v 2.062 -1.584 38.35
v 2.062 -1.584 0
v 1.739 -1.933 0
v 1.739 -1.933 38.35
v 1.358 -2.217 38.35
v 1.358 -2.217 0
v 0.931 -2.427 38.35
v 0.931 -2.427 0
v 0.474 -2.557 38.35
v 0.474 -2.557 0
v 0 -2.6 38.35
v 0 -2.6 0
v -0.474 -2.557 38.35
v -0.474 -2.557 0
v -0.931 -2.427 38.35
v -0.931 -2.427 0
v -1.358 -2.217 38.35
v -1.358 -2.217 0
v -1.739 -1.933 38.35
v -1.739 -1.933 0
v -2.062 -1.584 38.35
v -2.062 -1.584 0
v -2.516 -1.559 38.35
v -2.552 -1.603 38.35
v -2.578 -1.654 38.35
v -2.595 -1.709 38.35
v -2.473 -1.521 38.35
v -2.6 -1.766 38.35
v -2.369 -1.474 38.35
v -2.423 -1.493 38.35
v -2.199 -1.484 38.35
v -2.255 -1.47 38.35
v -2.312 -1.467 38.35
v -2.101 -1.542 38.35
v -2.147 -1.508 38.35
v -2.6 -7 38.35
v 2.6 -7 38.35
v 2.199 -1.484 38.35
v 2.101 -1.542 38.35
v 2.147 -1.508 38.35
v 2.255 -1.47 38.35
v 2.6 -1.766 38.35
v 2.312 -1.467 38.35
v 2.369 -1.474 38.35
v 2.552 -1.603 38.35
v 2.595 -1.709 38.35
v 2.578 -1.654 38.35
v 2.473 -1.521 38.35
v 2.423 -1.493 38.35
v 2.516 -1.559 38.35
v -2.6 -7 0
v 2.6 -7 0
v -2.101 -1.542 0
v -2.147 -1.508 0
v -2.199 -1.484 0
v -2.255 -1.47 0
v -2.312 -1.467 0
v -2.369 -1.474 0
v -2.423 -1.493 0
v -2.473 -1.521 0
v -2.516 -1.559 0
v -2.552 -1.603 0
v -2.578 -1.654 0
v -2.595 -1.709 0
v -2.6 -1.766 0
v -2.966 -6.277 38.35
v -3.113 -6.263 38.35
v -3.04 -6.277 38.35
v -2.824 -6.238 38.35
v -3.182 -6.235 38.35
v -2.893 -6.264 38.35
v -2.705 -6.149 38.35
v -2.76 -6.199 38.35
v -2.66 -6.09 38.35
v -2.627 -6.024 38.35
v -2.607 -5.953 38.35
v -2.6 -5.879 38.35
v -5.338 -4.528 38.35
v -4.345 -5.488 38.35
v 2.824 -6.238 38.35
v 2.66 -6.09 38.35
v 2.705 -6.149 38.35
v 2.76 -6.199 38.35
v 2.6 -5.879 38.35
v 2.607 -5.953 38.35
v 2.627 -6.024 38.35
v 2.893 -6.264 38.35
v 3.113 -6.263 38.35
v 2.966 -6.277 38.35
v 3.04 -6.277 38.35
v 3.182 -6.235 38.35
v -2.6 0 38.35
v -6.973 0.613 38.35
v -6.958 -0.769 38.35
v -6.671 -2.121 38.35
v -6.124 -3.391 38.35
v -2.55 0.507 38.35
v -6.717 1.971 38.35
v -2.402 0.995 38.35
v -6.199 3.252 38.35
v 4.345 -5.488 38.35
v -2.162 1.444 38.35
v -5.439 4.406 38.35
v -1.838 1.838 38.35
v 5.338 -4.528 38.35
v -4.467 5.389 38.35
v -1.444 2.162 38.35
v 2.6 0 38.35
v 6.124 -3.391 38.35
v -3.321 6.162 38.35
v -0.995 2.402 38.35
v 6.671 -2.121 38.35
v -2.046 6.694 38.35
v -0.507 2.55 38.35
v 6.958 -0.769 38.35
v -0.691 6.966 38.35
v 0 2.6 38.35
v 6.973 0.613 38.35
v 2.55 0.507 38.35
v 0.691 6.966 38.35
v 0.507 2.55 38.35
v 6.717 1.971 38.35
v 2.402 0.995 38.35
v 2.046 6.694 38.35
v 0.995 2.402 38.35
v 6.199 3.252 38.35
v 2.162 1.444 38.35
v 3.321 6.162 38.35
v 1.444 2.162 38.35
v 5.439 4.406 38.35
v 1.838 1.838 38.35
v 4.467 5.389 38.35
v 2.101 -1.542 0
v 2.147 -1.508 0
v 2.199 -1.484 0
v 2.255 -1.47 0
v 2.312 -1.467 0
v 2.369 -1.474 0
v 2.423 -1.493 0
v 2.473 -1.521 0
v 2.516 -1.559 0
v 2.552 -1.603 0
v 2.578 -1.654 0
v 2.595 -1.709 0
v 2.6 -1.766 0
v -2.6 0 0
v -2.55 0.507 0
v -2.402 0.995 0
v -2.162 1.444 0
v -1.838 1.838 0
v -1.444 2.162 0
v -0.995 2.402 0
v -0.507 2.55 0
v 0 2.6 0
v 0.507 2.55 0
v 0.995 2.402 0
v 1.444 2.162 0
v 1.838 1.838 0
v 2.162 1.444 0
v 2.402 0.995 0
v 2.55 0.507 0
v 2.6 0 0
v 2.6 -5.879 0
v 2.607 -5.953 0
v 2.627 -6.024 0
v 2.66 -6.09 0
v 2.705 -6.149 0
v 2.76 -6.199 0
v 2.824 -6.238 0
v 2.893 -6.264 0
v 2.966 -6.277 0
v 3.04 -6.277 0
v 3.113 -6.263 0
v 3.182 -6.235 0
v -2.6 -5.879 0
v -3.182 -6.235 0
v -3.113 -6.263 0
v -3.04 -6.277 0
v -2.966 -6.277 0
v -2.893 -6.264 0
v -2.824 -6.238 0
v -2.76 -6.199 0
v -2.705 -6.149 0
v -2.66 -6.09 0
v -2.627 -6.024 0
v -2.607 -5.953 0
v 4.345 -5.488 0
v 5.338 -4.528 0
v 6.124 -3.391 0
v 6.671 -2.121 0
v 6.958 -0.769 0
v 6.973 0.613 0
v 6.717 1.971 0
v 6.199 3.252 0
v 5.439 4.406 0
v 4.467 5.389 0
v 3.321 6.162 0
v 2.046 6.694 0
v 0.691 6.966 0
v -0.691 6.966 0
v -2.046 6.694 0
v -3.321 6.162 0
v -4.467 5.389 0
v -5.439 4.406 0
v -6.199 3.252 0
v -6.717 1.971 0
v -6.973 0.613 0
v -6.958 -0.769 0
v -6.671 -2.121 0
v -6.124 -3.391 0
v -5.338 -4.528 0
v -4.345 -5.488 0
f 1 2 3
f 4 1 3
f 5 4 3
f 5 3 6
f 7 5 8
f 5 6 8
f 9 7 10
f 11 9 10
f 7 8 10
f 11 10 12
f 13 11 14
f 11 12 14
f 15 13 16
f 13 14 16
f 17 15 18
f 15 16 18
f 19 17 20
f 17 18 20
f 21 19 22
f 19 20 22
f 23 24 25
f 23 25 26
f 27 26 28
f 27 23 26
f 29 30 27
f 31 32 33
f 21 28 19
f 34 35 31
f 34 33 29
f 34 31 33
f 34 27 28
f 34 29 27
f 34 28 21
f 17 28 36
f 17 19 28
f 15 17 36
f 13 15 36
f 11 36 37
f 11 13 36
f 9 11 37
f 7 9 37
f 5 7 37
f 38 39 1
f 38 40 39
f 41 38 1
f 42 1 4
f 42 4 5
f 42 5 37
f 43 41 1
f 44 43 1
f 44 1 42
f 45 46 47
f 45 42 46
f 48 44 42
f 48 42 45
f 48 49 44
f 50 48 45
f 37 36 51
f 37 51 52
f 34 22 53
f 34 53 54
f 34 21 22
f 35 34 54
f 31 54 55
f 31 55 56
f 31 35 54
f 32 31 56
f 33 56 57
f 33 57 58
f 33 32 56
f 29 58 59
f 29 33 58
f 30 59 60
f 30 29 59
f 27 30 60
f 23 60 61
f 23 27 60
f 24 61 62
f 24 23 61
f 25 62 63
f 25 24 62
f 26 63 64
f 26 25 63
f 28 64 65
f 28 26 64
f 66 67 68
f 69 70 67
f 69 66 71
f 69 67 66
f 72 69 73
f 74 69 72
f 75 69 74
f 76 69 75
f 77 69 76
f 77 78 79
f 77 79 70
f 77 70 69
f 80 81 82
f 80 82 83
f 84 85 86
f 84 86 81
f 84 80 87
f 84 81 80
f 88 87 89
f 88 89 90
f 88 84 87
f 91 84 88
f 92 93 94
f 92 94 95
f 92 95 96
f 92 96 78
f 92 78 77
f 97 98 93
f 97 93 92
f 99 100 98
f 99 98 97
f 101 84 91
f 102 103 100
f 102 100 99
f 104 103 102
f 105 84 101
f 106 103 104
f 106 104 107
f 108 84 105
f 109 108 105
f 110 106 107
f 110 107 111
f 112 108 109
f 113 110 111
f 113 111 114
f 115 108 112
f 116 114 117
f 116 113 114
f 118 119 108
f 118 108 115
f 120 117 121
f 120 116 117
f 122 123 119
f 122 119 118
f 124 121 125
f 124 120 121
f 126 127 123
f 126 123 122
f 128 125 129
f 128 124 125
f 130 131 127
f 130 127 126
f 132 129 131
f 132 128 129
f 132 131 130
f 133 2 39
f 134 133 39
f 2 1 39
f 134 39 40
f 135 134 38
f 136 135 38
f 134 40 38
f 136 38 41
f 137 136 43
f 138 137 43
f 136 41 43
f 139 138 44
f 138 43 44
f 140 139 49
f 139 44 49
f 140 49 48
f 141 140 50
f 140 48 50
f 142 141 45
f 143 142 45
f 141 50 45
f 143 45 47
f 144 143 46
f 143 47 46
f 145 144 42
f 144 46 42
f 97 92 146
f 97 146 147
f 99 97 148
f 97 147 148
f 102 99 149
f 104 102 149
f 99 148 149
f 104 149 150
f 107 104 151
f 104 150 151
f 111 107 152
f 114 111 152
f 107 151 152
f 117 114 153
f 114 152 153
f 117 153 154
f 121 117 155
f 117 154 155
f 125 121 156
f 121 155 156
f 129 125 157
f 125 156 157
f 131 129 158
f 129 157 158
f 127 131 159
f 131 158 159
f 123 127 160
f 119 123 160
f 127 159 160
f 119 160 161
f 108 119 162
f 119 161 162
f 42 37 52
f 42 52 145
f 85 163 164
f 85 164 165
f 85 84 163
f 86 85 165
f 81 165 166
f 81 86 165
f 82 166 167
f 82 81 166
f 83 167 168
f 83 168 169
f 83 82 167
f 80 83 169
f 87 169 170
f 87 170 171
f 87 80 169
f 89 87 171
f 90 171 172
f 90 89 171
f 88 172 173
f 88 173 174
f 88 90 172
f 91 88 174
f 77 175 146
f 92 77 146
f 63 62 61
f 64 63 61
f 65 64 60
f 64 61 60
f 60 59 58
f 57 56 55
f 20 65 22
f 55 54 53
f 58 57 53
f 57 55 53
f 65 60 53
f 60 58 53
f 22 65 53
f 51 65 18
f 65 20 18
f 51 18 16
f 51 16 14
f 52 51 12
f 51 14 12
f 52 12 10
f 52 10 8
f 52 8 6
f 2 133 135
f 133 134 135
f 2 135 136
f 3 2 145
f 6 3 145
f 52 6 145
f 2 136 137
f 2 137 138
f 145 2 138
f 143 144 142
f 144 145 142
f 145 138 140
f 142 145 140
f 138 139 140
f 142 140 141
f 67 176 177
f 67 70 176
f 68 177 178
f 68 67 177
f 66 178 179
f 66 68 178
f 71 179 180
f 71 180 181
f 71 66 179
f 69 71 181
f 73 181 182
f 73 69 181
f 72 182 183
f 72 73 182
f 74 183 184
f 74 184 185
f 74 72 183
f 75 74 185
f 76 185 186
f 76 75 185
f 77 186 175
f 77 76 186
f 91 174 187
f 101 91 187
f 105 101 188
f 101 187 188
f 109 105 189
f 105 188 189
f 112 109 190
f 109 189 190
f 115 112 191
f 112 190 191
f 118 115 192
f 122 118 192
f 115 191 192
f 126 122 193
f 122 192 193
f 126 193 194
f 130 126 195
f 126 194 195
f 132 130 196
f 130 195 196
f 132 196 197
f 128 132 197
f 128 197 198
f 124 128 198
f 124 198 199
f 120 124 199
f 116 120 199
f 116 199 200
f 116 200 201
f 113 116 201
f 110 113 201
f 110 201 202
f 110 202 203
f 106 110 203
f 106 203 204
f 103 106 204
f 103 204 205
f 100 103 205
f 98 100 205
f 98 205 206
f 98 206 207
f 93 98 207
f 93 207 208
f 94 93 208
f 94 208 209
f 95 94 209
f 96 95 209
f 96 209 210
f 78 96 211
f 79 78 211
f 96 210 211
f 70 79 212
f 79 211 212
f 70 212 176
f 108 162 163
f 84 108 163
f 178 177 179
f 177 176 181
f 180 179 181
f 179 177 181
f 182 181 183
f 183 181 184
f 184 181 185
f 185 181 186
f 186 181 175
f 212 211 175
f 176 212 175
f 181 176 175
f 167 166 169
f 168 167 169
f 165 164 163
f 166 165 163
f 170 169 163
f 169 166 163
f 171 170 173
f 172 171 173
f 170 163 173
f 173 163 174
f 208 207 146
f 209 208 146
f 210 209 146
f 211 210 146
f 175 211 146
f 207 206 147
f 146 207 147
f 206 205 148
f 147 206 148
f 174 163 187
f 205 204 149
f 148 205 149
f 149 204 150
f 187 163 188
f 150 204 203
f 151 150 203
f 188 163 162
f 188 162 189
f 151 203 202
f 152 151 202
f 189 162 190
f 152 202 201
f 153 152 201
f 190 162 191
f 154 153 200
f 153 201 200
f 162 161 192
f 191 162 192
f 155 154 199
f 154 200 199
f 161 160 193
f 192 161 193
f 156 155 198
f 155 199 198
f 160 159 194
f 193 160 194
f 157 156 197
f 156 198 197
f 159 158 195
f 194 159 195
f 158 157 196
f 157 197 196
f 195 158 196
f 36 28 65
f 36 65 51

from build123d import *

# Parameters (mm, degrees)
F1_DEPTH = 38.35
F2_DEPTH = 38.35
F3_R     = 0.3
F4_R     = 0.4


with BuildPart() as f1:
    # F0 (on Top) → F1 (new body)
    with BuildSketch(Plane.XY):
        with BuildLine():
            ThreePointArc((-2.6, 0), (0, 2.6), (2.6, 0))
            Line((2.6, 0), (2.6, -6.4992307237))
            ThreePointArc((2.6, -6.4992307237), (0, 7), (-2.6, -6.4992307237))
            Line((-2.6, -6.4992307237), (-2.6, 0))
        make_face()
    extrude(amount=F1_DEPTH)

    # F4
    f4_edges = [f1.edges().sort_by_distance(p)[0] for p in [
        (-2.6, -6.499231, 19.175),
        (2.6, -6.499231, 19.175),
    ]]
    fillet(f4_edges, radius=F4_R)


with BuildPart() as f2:
    # F0 (on Top) → F2 (new body)
    with BuildSketch(Plane.XY):
        with BuildLine():
            Line((2.6, -6.4992307237), (2.6, 0))
            ThreePointArc((2.6, 0), (0, -2.6), (-2.6, 0))
            Line((-2.6, 0), (-2.6, -6.4992307237))
            Line((-2.6, -6.4992307237), (-2.6, -7))
            Line((-2.6, -7), (0, -7))
            Line((0, -7), (2.6, -7))
            Line((2.6, -7), (2.6, -6.4992307237))
        make_face()
    extrude(amount=F2_DEPTH)

    # F3
    f3_edges = [f2.edges().sort_by_distance(p)[0] for p in [
        (-2.6, 0, 19.175),
        (2.6, 0, 19.175),
    ]]
    fillet(f3_edges, radius=F3_R)


solid = Compound([f1.part, f2.part])
